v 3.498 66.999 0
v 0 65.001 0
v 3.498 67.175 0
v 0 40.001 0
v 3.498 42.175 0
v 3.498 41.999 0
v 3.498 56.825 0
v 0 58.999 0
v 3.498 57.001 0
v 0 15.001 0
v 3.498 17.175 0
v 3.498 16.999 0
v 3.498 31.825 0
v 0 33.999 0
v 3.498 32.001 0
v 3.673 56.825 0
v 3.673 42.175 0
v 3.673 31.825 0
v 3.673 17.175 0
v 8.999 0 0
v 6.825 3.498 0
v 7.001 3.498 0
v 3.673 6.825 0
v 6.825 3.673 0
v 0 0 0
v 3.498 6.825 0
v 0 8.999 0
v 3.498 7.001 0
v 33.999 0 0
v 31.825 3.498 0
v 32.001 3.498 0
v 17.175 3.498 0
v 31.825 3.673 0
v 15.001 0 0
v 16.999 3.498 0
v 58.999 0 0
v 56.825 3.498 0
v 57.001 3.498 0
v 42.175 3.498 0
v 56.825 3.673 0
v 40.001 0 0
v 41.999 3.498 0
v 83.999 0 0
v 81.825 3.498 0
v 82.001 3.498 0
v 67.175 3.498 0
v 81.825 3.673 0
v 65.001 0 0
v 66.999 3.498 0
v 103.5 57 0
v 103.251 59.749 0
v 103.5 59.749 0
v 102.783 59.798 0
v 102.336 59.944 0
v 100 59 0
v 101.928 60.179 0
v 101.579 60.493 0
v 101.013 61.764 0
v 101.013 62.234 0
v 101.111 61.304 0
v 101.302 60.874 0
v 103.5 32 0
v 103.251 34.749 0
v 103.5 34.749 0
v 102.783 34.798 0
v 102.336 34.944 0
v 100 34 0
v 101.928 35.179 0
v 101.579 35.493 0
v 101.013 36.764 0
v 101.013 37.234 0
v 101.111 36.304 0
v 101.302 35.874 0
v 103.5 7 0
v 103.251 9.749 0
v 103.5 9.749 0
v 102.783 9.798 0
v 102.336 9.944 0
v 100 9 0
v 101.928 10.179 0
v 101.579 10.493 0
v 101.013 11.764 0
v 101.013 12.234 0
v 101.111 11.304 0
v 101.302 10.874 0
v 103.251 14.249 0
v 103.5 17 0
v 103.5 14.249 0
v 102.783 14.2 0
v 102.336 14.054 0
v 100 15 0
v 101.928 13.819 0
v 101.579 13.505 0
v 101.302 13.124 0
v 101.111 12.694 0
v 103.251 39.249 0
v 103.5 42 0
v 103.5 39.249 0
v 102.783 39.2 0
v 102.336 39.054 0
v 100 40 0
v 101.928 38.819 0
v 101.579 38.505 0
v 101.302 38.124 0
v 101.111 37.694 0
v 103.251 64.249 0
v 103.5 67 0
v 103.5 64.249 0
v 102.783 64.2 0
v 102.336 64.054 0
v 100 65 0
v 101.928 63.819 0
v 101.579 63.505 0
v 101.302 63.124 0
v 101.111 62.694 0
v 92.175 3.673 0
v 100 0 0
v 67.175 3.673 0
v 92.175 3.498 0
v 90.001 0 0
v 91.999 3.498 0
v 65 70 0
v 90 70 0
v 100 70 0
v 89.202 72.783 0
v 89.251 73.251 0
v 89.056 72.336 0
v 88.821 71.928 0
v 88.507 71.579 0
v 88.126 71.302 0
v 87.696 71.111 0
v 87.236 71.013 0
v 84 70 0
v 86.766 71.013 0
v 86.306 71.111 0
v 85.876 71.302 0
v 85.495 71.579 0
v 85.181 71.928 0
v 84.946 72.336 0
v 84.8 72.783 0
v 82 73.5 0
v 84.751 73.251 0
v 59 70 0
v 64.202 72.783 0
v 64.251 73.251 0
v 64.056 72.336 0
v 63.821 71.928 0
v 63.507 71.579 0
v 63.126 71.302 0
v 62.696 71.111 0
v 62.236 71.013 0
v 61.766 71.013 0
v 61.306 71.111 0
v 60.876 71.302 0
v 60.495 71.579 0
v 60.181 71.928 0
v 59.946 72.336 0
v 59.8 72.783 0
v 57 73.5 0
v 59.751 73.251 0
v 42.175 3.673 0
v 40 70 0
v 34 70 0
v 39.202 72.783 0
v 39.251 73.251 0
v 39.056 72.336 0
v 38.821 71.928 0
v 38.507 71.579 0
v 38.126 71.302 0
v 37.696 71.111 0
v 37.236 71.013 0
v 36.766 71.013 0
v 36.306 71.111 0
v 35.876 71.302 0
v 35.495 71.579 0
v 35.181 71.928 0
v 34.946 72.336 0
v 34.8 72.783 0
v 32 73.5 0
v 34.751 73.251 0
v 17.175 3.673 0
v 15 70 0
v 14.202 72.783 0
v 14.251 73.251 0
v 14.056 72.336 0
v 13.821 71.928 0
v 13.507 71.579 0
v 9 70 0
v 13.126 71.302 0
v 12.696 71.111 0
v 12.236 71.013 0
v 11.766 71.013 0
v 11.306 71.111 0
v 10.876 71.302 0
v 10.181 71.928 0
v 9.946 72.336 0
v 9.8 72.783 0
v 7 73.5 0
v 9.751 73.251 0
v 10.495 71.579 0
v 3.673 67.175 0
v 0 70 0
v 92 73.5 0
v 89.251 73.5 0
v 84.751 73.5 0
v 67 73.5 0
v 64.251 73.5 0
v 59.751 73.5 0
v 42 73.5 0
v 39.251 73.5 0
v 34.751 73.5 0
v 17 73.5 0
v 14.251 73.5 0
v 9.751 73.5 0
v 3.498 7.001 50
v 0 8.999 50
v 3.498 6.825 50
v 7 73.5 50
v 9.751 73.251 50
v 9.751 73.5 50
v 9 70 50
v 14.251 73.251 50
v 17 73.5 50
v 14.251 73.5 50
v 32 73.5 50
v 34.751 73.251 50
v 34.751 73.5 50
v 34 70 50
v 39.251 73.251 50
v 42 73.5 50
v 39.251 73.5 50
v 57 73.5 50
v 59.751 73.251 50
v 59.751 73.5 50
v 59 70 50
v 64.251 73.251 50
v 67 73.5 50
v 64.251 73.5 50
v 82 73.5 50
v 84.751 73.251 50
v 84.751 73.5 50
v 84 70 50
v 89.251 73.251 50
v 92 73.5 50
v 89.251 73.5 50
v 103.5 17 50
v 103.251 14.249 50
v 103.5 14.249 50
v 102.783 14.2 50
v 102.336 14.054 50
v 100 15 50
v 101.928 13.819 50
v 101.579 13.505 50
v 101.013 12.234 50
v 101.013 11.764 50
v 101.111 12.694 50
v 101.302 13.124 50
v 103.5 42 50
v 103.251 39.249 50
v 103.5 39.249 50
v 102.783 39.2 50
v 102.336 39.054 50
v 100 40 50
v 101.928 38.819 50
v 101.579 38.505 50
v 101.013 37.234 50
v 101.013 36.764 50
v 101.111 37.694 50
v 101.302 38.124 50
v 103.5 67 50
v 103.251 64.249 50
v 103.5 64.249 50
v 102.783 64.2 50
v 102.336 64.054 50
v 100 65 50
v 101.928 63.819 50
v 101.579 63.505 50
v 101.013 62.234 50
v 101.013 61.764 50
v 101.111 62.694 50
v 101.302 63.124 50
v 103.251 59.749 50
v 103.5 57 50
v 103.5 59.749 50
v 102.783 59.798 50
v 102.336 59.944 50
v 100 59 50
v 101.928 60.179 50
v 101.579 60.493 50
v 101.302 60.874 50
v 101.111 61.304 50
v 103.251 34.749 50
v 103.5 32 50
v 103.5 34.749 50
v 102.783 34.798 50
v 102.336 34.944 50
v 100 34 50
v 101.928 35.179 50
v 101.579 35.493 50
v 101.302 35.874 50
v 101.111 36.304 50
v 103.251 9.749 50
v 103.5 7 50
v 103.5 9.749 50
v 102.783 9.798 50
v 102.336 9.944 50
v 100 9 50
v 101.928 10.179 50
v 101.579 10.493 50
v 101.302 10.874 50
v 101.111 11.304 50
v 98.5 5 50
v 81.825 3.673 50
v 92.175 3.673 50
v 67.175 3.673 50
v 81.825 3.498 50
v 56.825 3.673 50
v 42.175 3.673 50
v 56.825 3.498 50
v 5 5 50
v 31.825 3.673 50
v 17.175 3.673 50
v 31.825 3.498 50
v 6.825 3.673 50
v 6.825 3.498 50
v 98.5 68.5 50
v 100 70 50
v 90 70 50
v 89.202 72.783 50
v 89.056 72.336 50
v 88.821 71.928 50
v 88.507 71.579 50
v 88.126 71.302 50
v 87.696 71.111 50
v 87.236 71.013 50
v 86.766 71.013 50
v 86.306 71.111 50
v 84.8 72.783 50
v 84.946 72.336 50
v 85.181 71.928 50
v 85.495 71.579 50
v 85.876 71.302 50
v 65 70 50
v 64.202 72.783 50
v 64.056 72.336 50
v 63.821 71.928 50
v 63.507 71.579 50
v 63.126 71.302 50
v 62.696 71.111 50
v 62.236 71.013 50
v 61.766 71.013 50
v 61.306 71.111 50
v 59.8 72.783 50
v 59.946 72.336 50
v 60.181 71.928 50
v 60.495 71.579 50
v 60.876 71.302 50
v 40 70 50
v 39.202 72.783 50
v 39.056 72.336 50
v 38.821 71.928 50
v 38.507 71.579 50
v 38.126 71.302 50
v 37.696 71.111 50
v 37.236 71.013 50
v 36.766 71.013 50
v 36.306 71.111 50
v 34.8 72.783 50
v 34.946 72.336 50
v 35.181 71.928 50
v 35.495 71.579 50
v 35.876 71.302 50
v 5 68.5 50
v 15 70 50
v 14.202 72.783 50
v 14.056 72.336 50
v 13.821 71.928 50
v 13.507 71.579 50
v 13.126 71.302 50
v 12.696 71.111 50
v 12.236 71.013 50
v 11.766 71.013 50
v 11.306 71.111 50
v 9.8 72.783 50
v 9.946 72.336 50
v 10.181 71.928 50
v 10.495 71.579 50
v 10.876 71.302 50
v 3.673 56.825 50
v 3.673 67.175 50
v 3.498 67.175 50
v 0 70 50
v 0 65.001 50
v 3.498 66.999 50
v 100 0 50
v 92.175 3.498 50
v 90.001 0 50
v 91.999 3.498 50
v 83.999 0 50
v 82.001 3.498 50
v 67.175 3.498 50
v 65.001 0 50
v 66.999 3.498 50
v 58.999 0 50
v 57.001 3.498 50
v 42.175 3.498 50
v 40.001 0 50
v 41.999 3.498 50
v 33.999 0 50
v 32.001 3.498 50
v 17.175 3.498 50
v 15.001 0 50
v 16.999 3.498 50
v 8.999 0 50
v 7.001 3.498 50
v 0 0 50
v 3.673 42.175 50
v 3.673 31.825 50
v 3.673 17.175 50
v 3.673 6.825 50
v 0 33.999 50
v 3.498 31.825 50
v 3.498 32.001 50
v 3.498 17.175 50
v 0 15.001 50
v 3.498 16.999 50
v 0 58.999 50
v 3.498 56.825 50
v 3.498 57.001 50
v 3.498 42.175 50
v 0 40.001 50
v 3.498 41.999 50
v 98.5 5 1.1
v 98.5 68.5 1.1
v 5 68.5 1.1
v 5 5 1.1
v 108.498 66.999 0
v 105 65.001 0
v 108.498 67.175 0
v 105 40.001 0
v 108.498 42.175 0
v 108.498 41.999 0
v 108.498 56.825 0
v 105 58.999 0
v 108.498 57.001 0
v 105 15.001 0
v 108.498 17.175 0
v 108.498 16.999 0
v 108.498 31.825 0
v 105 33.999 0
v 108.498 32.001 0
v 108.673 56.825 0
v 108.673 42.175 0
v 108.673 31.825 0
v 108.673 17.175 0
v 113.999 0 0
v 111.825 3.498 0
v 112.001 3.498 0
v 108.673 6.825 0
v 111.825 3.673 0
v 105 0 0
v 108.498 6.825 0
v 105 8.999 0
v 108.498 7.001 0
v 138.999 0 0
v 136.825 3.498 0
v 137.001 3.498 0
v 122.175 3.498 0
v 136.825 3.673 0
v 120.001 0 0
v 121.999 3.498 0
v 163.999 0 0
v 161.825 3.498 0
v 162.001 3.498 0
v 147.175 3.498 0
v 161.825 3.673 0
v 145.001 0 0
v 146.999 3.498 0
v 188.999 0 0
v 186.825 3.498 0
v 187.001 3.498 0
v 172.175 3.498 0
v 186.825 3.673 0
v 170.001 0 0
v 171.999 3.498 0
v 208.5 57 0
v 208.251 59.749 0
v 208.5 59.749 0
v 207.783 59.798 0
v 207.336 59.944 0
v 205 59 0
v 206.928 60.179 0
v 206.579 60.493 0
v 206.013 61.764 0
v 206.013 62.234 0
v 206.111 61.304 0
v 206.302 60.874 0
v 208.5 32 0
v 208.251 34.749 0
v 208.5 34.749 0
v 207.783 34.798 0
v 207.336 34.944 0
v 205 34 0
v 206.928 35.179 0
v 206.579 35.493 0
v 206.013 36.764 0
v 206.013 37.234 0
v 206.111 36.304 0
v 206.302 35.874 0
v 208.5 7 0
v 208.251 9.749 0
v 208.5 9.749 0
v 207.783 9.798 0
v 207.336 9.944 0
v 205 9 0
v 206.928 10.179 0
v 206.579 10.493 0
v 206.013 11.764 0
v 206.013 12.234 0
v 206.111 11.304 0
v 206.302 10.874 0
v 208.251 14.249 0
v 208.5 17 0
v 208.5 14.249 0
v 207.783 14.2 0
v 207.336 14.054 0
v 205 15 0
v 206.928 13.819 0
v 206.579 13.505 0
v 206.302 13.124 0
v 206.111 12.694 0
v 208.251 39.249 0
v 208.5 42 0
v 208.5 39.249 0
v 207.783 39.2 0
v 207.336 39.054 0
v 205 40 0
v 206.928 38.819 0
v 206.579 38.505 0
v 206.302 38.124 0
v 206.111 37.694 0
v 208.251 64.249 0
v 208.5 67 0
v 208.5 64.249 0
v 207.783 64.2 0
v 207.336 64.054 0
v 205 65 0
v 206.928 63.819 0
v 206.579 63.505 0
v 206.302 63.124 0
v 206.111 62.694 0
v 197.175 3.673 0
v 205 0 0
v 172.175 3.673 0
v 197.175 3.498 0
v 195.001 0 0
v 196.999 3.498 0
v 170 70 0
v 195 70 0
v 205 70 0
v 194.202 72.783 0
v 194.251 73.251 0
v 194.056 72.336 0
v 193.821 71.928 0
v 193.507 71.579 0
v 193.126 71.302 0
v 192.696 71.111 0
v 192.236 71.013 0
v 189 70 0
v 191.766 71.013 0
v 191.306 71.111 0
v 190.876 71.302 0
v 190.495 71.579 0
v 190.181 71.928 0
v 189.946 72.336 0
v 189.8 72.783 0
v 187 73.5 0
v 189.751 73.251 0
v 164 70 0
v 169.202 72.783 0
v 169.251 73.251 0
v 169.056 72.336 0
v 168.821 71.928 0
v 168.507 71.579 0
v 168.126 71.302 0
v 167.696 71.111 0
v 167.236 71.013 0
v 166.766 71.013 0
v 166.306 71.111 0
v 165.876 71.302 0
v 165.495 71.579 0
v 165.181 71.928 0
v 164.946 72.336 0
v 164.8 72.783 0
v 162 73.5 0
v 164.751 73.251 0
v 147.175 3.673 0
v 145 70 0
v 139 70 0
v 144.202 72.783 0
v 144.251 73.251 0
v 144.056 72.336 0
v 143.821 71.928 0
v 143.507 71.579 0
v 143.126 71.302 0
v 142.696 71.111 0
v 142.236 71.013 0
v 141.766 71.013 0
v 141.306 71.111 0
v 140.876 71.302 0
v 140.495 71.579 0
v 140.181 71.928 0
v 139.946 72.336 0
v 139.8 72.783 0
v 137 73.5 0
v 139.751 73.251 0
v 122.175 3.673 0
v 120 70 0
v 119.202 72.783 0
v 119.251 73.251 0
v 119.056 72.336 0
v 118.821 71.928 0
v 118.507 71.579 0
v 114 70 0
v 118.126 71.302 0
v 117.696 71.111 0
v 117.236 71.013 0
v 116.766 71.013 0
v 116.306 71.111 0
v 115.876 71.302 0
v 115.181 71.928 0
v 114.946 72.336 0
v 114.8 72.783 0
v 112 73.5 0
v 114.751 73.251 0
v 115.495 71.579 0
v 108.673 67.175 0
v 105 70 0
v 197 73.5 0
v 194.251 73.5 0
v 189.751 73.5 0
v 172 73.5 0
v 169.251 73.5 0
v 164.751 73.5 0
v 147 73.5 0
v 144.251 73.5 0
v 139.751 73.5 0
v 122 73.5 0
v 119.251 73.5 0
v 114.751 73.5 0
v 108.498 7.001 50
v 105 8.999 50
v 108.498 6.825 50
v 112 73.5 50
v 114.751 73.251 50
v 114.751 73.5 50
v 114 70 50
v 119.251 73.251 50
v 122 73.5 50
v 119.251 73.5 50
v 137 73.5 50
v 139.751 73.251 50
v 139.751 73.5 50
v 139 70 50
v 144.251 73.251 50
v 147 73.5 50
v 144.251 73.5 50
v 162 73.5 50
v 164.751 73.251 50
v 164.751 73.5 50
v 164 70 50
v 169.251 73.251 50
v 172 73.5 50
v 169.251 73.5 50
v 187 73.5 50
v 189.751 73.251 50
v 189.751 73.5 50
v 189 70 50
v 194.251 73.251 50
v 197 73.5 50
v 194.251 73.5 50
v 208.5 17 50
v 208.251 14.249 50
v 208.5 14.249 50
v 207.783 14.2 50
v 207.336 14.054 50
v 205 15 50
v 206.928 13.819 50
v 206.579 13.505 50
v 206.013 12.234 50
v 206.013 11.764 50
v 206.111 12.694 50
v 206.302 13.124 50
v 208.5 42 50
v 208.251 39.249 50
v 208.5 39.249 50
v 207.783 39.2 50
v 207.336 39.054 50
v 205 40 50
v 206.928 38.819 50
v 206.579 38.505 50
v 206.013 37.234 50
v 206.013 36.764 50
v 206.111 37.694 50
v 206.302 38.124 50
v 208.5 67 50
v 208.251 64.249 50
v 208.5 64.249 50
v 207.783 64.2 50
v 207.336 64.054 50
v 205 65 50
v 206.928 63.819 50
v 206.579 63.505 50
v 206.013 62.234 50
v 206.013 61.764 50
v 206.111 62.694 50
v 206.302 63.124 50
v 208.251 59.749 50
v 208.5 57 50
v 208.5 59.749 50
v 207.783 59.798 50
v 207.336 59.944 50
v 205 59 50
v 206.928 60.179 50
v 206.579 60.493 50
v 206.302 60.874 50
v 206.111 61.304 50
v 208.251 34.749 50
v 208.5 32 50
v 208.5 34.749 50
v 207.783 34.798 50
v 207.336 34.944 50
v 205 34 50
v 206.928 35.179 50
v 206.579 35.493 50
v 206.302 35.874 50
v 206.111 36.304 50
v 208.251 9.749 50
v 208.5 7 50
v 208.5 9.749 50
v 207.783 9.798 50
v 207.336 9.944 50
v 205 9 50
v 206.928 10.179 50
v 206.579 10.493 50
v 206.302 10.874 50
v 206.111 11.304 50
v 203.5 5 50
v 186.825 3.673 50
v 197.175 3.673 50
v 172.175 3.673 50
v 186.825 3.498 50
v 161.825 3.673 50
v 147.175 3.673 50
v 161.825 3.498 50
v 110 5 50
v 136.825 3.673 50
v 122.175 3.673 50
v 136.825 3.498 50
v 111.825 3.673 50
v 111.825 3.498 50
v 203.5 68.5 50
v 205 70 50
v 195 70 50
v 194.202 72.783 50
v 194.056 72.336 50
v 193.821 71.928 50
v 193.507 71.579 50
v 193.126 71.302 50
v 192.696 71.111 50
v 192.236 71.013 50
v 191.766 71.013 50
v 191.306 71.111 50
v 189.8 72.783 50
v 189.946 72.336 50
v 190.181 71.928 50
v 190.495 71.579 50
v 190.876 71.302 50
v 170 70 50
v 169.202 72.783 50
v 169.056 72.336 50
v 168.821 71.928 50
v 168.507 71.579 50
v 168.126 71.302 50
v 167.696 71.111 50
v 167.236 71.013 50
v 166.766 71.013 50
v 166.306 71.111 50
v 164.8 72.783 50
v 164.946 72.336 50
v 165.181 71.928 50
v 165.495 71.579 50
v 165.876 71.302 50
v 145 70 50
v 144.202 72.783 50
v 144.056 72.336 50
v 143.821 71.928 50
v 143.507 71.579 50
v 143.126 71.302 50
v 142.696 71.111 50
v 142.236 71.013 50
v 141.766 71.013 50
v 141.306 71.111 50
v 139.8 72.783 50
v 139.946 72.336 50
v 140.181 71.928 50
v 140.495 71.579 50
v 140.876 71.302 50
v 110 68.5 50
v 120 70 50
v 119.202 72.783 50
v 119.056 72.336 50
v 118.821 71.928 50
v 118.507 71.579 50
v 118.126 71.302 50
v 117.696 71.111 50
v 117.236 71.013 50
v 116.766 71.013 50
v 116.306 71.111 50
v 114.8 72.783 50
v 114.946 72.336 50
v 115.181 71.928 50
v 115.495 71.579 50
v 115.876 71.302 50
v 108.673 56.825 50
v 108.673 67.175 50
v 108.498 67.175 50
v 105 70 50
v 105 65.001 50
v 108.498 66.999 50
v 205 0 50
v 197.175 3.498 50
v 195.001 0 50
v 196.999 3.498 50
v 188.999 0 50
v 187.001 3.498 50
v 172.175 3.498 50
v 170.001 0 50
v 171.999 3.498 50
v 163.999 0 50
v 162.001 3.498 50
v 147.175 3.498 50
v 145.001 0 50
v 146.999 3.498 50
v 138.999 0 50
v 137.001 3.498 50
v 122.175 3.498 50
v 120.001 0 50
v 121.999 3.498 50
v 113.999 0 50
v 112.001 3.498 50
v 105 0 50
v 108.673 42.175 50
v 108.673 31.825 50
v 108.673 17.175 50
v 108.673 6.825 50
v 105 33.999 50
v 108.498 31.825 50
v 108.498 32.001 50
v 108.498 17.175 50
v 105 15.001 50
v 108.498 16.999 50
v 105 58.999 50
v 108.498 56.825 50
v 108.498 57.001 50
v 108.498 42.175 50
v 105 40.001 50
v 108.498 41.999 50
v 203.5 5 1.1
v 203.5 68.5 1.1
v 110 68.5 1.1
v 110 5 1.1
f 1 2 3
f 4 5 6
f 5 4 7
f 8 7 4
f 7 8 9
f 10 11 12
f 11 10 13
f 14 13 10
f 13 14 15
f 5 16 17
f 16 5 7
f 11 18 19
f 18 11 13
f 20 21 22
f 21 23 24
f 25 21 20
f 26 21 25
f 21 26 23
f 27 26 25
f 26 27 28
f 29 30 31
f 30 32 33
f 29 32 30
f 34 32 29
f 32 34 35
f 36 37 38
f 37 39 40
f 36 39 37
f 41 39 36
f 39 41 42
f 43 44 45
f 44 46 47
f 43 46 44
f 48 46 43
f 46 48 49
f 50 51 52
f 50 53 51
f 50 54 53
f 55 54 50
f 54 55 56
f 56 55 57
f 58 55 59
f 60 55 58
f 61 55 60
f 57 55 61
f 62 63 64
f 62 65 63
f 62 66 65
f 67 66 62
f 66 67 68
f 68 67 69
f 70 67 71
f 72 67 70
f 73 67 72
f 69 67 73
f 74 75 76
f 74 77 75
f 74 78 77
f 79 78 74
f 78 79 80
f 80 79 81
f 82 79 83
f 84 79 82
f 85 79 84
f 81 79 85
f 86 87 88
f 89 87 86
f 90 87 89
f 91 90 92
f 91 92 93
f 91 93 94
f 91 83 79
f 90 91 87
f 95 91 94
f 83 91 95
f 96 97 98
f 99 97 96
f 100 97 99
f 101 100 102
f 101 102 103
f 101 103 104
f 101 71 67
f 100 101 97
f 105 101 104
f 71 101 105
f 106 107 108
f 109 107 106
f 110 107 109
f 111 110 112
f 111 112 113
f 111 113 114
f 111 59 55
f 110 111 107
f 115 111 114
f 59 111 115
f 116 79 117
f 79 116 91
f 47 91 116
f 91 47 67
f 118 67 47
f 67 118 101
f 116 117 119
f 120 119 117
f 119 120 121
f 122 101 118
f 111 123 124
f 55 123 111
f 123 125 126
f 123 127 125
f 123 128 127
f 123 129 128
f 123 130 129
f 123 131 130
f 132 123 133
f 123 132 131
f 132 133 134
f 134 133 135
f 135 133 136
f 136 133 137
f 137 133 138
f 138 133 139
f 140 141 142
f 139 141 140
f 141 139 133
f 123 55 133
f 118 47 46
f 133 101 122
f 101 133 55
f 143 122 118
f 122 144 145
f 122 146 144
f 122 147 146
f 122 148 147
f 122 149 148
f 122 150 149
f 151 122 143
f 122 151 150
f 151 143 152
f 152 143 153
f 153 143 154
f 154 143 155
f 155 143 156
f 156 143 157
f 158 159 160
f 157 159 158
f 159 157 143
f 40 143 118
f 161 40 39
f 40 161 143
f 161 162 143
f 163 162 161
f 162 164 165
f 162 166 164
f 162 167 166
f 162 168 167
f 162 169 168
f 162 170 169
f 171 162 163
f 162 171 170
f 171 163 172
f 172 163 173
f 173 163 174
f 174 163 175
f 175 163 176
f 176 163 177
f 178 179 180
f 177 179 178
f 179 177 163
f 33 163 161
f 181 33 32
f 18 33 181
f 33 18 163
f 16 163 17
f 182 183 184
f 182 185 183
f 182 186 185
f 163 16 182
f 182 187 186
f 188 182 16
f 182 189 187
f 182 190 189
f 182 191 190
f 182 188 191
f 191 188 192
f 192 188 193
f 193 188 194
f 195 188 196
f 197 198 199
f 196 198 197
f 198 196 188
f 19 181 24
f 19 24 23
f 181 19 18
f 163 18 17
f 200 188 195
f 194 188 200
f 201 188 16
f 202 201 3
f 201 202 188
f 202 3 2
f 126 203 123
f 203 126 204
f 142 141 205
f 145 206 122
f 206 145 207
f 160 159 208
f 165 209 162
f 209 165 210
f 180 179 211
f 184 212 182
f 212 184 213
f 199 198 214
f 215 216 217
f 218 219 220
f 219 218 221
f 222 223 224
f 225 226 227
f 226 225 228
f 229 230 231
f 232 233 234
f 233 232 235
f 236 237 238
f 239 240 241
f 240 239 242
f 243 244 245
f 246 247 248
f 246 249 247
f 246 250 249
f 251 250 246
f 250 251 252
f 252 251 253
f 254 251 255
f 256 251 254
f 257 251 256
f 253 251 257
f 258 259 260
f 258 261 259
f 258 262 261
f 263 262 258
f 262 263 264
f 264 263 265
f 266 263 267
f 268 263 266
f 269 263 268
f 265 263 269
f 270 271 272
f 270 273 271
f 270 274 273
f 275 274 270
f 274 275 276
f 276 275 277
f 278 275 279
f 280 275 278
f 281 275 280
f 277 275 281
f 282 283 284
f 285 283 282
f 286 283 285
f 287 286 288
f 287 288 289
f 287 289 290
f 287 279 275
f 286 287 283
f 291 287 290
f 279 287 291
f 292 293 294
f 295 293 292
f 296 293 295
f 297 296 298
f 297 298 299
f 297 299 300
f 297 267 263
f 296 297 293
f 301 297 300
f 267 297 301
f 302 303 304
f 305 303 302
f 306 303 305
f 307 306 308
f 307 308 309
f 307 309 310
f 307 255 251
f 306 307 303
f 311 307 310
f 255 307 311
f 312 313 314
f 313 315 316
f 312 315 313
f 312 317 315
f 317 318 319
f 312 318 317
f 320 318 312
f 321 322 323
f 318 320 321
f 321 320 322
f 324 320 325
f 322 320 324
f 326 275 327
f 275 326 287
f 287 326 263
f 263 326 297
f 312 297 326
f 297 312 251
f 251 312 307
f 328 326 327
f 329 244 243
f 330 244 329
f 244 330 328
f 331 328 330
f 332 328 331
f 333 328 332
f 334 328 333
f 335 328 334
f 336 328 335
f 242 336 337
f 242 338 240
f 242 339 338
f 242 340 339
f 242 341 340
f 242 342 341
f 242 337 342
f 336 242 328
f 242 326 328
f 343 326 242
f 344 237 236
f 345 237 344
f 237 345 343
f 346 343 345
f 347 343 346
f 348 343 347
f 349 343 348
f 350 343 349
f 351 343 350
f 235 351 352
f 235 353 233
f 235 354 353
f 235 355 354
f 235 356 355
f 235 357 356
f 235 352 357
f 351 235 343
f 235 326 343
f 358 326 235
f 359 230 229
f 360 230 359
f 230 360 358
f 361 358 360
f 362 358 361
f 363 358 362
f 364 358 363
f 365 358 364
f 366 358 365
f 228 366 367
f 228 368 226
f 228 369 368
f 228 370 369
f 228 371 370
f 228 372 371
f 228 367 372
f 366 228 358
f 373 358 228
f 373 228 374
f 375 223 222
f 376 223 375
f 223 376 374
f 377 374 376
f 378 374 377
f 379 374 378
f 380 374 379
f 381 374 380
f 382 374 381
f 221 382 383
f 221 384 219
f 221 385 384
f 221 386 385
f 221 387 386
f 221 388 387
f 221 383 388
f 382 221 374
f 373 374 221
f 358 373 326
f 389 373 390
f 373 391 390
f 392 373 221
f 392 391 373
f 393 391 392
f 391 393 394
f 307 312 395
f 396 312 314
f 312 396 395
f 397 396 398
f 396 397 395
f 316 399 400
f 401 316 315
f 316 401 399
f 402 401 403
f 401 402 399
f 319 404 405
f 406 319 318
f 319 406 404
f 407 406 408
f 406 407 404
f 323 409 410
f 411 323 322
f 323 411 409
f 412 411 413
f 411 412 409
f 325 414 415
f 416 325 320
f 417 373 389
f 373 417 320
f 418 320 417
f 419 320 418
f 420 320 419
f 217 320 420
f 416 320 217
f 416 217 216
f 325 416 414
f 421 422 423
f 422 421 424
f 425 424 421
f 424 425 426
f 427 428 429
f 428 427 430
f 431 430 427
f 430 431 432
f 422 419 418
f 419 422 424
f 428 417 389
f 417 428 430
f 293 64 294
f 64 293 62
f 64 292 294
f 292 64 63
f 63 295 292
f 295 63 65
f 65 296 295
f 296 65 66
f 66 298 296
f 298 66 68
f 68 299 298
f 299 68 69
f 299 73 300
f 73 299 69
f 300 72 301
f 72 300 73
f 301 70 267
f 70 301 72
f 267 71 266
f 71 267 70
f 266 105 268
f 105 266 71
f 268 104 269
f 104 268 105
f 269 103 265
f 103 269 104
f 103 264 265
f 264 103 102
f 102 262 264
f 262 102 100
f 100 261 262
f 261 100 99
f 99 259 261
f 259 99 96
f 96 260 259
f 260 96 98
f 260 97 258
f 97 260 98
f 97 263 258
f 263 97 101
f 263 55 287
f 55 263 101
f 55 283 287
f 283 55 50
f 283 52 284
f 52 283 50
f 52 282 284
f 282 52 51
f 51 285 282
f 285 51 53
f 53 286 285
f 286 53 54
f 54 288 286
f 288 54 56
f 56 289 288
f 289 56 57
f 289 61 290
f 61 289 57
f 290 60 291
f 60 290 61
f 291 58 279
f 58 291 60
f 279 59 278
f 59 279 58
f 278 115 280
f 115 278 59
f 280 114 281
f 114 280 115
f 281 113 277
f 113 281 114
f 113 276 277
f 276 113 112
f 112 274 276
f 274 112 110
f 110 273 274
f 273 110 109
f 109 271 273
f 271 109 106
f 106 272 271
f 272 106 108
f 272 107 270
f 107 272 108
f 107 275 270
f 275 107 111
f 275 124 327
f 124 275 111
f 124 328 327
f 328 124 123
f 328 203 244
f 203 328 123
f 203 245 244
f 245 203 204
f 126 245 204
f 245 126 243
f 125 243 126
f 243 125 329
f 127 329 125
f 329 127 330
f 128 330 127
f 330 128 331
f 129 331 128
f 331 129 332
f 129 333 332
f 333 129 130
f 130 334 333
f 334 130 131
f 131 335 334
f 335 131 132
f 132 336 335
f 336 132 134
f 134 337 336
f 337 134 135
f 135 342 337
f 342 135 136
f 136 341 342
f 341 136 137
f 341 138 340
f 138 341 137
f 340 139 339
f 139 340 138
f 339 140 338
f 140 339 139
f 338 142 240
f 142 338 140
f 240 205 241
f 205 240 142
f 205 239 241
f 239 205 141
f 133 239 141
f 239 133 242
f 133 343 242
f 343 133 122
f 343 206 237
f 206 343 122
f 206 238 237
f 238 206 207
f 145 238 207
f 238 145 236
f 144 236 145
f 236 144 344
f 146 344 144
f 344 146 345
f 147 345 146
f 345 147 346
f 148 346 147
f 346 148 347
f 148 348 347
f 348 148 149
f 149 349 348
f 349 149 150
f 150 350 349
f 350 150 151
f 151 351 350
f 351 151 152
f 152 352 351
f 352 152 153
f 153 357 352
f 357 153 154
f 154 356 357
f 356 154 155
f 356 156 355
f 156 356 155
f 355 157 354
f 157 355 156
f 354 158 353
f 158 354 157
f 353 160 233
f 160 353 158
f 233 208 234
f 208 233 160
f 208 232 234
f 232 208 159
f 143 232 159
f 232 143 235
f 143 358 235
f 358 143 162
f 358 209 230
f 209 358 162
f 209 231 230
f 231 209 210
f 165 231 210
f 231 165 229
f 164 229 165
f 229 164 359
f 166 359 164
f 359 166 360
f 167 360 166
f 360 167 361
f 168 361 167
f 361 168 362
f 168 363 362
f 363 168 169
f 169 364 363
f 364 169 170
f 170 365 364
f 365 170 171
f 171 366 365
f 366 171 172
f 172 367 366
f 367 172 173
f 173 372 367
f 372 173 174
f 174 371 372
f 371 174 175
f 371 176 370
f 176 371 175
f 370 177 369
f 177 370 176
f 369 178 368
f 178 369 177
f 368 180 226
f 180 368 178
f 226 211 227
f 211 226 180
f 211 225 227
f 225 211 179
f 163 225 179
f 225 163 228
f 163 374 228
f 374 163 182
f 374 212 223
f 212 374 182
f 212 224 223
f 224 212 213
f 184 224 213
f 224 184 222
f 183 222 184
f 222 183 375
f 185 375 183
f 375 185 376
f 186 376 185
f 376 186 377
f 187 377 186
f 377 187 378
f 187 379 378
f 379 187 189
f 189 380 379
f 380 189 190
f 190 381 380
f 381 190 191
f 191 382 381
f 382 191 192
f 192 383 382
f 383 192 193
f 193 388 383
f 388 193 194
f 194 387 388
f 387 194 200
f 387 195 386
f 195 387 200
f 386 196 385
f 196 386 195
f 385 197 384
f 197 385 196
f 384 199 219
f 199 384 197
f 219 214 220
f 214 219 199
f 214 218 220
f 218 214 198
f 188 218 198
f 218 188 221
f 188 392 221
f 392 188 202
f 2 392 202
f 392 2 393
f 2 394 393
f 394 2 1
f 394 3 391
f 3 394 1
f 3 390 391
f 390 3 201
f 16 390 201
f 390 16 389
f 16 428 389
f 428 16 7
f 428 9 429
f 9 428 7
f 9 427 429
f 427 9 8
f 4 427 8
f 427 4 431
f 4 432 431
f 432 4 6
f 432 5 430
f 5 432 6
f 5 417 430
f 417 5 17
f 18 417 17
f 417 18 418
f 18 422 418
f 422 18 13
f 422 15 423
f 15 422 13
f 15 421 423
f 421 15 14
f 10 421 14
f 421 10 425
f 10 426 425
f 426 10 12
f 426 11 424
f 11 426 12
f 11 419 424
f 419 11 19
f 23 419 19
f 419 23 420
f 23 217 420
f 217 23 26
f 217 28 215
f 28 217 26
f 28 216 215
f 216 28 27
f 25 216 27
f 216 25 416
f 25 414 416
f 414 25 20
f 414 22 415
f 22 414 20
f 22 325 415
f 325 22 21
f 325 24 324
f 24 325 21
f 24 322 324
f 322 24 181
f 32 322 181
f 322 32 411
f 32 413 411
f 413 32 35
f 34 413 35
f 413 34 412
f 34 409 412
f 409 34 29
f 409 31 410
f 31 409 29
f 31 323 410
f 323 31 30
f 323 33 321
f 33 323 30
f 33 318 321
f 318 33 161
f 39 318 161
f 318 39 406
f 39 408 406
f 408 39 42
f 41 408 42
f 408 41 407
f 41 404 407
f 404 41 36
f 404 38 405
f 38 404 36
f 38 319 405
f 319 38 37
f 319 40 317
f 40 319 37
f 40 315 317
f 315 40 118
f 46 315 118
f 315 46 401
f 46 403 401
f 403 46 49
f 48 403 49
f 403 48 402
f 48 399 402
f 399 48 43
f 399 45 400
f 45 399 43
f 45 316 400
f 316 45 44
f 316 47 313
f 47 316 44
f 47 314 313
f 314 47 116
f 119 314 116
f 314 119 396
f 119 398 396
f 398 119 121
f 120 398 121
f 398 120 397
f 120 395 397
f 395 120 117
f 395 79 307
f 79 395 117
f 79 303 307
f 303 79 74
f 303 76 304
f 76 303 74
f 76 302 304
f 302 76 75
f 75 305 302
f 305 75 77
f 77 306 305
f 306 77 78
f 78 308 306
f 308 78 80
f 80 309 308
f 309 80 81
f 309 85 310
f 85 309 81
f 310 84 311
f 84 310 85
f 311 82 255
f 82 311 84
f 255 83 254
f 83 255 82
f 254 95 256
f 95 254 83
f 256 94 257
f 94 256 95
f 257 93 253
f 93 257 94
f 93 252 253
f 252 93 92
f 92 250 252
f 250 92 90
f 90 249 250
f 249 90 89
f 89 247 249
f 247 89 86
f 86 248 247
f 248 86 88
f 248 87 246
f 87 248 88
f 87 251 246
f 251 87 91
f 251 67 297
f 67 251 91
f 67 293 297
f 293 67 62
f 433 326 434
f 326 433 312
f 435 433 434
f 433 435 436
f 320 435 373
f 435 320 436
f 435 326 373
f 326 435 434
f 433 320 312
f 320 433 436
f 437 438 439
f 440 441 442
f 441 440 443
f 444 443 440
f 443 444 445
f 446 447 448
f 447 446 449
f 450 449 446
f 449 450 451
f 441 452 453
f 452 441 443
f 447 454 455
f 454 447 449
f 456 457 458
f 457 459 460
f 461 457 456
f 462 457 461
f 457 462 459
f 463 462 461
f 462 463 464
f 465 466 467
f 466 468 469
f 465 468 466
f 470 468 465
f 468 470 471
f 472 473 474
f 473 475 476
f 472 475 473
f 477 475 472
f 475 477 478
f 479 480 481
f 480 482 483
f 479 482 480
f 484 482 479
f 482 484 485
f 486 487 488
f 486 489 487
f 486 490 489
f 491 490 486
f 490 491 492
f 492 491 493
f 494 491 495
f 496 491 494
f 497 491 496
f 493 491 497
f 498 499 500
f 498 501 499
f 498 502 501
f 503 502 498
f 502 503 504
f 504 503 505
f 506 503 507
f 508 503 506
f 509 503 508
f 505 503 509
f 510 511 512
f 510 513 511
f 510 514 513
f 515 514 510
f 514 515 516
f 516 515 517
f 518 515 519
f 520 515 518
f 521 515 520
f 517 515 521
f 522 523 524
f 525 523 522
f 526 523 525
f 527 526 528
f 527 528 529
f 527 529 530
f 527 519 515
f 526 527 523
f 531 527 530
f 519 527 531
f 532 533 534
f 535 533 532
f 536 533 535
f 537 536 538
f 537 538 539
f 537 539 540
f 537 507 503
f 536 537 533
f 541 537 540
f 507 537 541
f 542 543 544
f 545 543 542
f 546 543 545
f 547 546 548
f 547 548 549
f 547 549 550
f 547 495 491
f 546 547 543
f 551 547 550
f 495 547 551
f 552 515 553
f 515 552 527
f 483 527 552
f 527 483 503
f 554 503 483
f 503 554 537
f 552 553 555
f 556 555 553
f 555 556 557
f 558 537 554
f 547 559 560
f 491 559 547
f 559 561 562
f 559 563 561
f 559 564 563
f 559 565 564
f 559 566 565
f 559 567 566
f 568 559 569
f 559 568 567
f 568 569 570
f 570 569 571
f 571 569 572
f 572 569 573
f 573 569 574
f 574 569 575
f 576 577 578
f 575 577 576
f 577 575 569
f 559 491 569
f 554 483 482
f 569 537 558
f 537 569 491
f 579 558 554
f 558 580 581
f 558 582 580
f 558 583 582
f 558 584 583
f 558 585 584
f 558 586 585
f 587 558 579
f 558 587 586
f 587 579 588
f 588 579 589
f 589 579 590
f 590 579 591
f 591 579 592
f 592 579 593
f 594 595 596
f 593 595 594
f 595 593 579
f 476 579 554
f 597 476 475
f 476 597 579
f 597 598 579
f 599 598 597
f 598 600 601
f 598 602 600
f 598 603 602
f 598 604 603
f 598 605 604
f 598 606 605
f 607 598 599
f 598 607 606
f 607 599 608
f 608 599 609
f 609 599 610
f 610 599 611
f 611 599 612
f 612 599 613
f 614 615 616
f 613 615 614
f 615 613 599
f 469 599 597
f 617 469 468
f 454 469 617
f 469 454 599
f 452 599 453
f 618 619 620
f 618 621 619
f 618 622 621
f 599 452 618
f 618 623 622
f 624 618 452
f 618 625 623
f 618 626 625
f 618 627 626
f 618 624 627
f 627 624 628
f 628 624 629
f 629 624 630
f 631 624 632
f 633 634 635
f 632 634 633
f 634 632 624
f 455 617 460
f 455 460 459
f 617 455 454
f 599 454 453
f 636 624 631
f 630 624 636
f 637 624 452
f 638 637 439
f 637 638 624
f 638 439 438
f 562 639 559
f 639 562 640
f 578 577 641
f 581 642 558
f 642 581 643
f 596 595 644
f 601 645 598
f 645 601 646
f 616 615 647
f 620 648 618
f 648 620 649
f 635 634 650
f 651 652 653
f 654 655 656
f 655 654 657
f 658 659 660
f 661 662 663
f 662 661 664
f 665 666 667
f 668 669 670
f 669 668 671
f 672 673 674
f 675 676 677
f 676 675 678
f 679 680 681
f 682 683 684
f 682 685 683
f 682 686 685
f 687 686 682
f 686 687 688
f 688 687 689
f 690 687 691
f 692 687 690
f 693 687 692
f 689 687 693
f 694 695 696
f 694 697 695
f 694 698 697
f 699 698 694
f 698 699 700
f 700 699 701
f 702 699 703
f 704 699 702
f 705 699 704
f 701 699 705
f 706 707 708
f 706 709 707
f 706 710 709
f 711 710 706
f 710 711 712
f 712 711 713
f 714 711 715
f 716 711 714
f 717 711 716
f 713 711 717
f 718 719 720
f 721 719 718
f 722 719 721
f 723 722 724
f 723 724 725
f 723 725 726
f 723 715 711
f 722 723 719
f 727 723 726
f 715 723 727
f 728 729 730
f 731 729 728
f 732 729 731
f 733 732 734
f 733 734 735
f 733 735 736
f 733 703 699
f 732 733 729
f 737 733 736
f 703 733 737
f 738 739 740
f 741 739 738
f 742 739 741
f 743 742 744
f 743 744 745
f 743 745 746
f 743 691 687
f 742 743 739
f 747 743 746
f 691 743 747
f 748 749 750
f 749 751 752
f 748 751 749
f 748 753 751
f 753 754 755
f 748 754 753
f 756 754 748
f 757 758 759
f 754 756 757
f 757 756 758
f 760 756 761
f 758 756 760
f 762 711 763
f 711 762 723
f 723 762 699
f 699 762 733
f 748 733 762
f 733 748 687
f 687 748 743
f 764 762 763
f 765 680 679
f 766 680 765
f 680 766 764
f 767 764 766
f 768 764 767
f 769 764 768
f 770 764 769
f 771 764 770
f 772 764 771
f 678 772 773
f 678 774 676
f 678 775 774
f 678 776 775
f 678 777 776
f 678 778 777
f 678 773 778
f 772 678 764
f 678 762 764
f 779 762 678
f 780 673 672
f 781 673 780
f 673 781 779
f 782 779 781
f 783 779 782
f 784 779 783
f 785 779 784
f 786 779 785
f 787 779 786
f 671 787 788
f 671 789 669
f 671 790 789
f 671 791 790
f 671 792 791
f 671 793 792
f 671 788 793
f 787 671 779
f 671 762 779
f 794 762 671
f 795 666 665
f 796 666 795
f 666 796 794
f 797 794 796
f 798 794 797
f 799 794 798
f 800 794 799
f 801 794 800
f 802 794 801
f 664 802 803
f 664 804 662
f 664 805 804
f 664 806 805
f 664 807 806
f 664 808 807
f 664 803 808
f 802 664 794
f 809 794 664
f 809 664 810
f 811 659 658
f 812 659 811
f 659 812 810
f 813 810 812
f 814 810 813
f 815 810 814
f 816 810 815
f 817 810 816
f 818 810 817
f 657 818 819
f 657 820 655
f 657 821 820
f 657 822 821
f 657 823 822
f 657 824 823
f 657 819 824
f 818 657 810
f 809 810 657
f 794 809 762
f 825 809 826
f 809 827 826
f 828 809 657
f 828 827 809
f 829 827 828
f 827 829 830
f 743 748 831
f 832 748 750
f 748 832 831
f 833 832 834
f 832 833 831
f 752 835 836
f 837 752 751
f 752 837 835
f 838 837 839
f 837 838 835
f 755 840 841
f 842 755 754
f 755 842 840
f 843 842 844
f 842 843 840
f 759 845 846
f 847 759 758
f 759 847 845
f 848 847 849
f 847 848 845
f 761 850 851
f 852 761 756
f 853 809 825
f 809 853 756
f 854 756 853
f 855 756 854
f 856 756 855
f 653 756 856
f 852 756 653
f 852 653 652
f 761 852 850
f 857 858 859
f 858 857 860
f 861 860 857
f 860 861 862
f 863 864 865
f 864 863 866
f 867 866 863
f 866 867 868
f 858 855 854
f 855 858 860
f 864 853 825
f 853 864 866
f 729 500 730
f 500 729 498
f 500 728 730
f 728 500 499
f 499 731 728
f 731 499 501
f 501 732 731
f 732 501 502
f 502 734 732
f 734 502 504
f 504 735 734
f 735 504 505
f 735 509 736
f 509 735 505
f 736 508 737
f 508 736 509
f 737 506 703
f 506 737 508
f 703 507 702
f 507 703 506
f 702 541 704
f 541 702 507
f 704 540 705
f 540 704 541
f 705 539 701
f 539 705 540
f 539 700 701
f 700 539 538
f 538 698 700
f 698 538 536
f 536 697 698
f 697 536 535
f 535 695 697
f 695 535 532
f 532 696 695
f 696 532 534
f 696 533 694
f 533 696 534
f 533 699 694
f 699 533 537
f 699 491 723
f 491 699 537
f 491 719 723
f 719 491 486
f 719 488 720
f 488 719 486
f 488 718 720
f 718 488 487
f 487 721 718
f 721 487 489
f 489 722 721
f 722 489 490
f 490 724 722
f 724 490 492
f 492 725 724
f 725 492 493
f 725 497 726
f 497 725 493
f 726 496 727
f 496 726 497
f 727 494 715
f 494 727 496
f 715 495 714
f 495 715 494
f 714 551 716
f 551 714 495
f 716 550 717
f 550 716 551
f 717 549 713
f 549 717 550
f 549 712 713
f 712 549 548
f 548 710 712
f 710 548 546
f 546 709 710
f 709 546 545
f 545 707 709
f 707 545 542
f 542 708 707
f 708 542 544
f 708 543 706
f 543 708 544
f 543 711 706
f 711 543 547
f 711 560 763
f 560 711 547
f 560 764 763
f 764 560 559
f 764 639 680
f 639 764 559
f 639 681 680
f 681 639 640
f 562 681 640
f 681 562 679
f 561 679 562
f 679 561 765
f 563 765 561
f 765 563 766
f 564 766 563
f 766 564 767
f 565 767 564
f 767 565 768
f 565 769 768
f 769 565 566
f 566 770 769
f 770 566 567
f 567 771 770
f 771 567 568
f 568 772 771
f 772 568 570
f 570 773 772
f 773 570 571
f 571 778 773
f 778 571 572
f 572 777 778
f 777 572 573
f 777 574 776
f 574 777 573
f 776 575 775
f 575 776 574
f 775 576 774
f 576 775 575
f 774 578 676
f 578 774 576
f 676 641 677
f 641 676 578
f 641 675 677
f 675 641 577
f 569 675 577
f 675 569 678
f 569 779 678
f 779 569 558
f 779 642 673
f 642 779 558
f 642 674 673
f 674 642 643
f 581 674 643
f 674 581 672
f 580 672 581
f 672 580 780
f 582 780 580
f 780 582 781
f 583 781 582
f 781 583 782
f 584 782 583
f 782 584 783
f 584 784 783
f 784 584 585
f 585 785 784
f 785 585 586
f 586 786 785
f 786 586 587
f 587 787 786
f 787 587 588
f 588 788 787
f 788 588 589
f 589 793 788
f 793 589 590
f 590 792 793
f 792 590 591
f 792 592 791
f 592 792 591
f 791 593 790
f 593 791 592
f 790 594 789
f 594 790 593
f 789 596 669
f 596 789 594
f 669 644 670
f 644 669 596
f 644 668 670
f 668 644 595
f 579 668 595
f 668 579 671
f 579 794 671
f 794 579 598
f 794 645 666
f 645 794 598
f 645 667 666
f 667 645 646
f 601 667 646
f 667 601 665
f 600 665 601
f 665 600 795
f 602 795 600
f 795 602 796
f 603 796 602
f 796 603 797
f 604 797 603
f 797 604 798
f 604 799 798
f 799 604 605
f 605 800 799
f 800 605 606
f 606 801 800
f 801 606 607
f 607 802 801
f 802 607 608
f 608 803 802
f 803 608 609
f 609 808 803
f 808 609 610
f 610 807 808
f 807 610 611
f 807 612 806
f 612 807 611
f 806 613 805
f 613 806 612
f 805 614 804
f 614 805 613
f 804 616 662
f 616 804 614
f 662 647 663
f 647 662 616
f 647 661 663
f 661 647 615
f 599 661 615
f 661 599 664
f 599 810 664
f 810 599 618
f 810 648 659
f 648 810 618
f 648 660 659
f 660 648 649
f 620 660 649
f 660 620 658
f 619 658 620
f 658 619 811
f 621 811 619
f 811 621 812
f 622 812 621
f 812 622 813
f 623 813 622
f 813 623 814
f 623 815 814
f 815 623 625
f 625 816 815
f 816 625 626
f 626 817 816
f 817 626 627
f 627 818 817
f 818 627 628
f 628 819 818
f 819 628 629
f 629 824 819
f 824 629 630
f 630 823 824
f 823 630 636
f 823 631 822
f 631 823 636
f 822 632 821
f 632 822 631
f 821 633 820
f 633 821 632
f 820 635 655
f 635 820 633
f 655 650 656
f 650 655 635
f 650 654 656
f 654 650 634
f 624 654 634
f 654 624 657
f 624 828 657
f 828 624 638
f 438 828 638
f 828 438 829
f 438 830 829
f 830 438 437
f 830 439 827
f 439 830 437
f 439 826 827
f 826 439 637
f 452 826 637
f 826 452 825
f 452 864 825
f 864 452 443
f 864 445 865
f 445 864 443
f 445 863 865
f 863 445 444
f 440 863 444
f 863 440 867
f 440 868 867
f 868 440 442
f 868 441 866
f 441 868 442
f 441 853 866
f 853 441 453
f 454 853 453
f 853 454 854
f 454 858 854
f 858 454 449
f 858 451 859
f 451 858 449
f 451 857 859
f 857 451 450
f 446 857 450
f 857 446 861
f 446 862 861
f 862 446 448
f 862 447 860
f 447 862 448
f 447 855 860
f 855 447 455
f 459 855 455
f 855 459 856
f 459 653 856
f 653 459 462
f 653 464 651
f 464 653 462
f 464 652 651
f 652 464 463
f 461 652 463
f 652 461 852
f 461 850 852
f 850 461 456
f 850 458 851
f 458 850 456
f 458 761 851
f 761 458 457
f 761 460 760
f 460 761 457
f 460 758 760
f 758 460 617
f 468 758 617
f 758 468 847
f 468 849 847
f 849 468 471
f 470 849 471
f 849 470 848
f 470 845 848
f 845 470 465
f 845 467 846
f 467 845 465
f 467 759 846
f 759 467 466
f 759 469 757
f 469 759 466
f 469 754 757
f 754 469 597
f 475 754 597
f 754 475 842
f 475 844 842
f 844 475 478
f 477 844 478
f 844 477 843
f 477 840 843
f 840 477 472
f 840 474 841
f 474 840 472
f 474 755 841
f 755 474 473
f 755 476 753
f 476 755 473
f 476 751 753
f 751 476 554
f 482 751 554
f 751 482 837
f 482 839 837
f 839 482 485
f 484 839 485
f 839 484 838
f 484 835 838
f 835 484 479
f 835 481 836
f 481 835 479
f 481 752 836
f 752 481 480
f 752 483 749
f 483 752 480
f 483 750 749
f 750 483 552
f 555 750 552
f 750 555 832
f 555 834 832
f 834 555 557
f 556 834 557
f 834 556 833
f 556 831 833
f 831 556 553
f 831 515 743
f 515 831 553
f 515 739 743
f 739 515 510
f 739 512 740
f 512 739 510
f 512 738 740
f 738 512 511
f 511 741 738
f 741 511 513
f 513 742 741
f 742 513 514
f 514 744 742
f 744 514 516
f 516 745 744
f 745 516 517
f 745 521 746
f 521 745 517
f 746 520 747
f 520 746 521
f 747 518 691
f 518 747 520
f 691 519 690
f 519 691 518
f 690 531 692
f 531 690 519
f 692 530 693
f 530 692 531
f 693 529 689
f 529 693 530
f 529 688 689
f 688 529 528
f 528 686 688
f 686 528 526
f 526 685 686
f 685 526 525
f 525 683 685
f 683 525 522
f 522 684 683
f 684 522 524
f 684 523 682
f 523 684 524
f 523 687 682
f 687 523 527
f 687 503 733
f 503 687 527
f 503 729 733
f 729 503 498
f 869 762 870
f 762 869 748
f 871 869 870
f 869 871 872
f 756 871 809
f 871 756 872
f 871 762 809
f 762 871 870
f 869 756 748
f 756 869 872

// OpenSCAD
amount=2; // how many boxes 
box_width=100;
box_height=70;
box_depth=50; 
box_floor=1.1;// Thicness of floor 
width_distance=25; // The distance between the dovetail on the x axis
height_distance=25;// The distance between the dovetail on the Y axis

module male_dovetail2d(max_width, min_width, depth,  cutout_width, cutout_depth) {
    difference(){    
        dovetail_2d(max_width,min_width,depth);
        translate([0.001,depth+0.001,0]){
            dovetail_cutout2D(cutout_width,cutout_depth);
        }
    }
}
module dovetail_cutout2D(cwidth, cdepth) {
	translate([0,-cdepth+cwidth/2,0])
		union() {
			translate([-cwidth/2,0,0])
				square([cwidth,cdepth-cwidth/2]);
			difference() {
				circle(r=cwidth/2,  $fs=0.25);
				translate([-cwidth/2-0.05,0.05]) 
                      square([cwidth+0.1,cwidth+0.1]);
			}
		}
}


module female_dovetail_negative2d(max_width, min_width, depth, clearance) {
	union() {
		translate([0,-0.001,0])
			dovetail_2d(max_width,min_width,depth);
			translate([-(max_width+clearance)/2, depth-0.002,0])
				square([max_width+clearance,clearance/2]);
	}
}

module dovetail_2d(max_width, min_width, depth) {
	angle=atan((max_width/2-min_width/2)/depth);	
	polygon(paths=[[0,1,2,3,0]], points=[[-min_width/2,0], [-max_width/2,depth], [max_width/2, depth], [min_width/2,0]]);
}





max_width=10;
min_width=6;
depth=3.5;//of dovetail
cut_width=depth+1;//3;
cut_depth=depth-1;//3;
clearance=0.35;
rim=1.5;

width_interval=width_distance;
height_interval=height_distance;
edge=depth+rim;


for(a=[0:amount-1]){
    translate([a*(box_width+edge),0,0]){
        generate();
    }    
}


startCut=(max_width/2)+2;
module bottom(){
  for(x=[startCut+depth+rim:width_interval:box_width-startCut]){
        translate([x,0,0]){  
            rotate(0){
                echo(x);
                children();
            }
        }
    }   
}

module left(){
    for(y=[startCut+depth+rim:height_interval:box_height-startCut]){    
        translate([0,y,0]){  
            rotate(270){
                children();
            }
        }
    }  
}

module right(){
    for(y=[startCut+depth+rim:height_interval:box_height-startCut]){    
        translate([box_width,y,0]){  
            rotate(270){
                children();
            }
        }
    }
}
module top(){
      
      for(x=[startCut+depth+rim:width_interval:box_width-startCut]){
        translate([x,box_height,0]){              
            rotate(0){
                children();
            }
        }
    }
}


module generate(){
    difference(){
    linear_extrude(box_depth){
        difference(){
            square([box_width,box_height]);
                          
           
            bottom(){
               female_dovetail_negative2d(max_width, min_width, depth,  clearance);
            } 
            left(){
              female_dovetail_negative2d(max_width, min_width, depth,  clearance);
            }

        }
        right(){
           male_dovetail2d(max_width, min_width, depth,  cut_width, cut_depth);
        }
        top(){
          male_dovetail2d(max_width, min_width, depth, cut_width, cut_depth);
        }
    }
     translate([edge,edge,box_floor]){
        cube([box_width-edge-rim,box_height-edge-rim,box_depth]);
     }
    }
}
